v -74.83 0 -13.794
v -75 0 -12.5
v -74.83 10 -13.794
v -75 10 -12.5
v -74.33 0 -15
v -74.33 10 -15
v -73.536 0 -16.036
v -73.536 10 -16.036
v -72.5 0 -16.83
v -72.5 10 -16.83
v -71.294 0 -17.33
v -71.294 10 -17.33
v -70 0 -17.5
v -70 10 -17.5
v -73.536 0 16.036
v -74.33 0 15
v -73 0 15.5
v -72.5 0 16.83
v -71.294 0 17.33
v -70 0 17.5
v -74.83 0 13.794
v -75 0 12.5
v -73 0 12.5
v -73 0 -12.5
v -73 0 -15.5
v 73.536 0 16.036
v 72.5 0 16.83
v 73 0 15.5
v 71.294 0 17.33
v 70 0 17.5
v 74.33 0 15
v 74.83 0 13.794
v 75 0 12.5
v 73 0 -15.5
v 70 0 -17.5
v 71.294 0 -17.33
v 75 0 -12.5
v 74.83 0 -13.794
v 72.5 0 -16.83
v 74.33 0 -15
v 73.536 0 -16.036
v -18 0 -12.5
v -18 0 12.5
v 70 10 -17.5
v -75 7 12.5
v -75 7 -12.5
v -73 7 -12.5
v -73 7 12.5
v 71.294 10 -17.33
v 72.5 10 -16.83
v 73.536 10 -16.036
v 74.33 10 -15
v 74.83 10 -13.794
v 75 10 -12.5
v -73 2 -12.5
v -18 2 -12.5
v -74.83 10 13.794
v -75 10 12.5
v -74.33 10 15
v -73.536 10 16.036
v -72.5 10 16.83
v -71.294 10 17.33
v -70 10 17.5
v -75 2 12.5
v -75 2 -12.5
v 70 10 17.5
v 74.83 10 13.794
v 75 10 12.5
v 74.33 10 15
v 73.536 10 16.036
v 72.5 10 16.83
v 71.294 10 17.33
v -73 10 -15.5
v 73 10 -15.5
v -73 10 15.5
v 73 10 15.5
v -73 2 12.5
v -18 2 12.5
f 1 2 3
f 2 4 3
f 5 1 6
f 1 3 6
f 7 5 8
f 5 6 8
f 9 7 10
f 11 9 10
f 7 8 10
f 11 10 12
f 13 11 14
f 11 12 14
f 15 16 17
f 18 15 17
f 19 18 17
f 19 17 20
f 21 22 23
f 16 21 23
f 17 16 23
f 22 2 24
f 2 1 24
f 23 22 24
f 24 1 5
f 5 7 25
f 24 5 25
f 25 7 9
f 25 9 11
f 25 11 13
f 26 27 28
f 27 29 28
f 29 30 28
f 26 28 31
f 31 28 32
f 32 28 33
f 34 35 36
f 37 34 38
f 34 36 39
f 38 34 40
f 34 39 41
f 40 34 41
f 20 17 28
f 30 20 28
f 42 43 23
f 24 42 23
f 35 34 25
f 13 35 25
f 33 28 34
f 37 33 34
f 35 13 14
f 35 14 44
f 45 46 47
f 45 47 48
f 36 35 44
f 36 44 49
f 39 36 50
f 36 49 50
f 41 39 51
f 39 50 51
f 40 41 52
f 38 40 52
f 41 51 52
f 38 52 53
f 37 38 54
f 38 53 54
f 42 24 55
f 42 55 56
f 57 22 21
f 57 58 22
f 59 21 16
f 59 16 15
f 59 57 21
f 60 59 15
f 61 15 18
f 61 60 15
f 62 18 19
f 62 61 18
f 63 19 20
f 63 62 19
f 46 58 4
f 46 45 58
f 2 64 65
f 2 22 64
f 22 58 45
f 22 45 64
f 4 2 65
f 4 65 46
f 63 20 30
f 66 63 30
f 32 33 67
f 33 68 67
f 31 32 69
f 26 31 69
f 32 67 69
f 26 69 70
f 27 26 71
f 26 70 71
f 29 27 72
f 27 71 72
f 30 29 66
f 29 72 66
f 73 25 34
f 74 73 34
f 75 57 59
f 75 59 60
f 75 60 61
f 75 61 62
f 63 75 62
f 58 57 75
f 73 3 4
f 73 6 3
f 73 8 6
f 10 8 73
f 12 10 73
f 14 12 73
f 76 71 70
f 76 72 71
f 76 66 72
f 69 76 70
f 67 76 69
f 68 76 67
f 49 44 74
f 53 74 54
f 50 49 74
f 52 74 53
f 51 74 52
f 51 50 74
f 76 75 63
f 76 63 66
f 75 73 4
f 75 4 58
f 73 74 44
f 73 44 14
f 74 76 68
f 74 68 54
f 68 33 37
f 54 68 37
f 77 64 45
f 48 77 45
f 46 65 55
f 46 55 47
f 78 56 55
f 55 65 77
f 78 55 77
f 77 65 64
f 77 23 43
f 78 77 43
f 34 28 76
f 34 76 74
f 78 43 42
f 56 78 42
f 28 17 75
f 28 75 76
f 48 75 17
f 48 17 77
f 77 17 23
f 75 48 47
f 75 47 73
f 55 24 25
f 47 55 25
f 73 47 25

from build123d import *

# Parameters (mm, degrees)
SKETCH1_W           = 150
SKETCH1_H           = 35
SKETCH1_W_2         = 146
SKETCH1_H_2         = 31
SKETCH1_W_3         = 55
SKETCH1_H_3         = 25
BOSS_EXTRUDE1_DEPTH = 10
SKETCH2_W           = 55
SKETCH2_H           = 25
CUT_EXTRUDE3_DEPTH  = 8
SKETCH6_W           = 25
SKETCH6_H           = 5
CUT_EXTRUDE4_DEPTH  = 8
FILLET1_R           = 5


with BuildPart() as part:
    # Sketch1 → Boss-Extrude1 (new body)
    # profile 1 of 2: a face of its own
    with BuildSketch(Plane(origin=(0, 0, 0), x_dir=(1, 0, 0), z_dir=(0, 1, 0))):
        Rectangle(SKETCH1_W, SKETCH1_H)
        Rectangle(SKETCH1_W_2, SKETCH1_H_2, mode=Mode.SUBTRACT)
    # profile 2 of 2: a face of its own
    with BuildSketch(Plane(origin=(0, 0, 0), x_dir=(1, 0, 0), z_dir=(0, 1, 0))):
        with Locations((-45.5, 0)):
            Rectangle(SKETCH1_W_3, SKETCH1_H_3)
    extrude(amount=BOSS_EXTRUDE1_DEPTH)

    # Sketch2 → Cut-Extrude3 (cut)
    with BuildSketch(Plane(origin=(0, 10, 0), x_dir=(1, 0, 0), z_dir=(0, 1, 0))):
        with Locations((-45.5, 0)):
            Rectangle(SKETCH2_W, SKETCH2_H)
    extrude(amount=-CUT_EXTRUDE3_DEPTH, mode=Mode.SUBTRACT)

    # Sketch6 → Cut-Extrude4 (cut)
    with BuildSketch(Plane.ZY.offset(75)):
        with Locations((0, 4.5)):
            Rectangle(SKETCH6_W, SKETCH6_H)
    extrude(amount=-CUT_EXTRUDE4_DEPTH, mode=Mode.SUBTRACT)

    # Fillet1
    fillet1_edges = [part.edges().sort_by_distance(p)[0] for p in [
        (-75, 5, 17.5),
        (-75, 5, -17.5),
        (75, 5, -17.5),
        (75, 5, 17.5),
    ]]
    fillet(fillet1_edges, radius=FILLET1_R - 0.0001)  # a hair under: the kernel refuses the full size


solid = part.part
